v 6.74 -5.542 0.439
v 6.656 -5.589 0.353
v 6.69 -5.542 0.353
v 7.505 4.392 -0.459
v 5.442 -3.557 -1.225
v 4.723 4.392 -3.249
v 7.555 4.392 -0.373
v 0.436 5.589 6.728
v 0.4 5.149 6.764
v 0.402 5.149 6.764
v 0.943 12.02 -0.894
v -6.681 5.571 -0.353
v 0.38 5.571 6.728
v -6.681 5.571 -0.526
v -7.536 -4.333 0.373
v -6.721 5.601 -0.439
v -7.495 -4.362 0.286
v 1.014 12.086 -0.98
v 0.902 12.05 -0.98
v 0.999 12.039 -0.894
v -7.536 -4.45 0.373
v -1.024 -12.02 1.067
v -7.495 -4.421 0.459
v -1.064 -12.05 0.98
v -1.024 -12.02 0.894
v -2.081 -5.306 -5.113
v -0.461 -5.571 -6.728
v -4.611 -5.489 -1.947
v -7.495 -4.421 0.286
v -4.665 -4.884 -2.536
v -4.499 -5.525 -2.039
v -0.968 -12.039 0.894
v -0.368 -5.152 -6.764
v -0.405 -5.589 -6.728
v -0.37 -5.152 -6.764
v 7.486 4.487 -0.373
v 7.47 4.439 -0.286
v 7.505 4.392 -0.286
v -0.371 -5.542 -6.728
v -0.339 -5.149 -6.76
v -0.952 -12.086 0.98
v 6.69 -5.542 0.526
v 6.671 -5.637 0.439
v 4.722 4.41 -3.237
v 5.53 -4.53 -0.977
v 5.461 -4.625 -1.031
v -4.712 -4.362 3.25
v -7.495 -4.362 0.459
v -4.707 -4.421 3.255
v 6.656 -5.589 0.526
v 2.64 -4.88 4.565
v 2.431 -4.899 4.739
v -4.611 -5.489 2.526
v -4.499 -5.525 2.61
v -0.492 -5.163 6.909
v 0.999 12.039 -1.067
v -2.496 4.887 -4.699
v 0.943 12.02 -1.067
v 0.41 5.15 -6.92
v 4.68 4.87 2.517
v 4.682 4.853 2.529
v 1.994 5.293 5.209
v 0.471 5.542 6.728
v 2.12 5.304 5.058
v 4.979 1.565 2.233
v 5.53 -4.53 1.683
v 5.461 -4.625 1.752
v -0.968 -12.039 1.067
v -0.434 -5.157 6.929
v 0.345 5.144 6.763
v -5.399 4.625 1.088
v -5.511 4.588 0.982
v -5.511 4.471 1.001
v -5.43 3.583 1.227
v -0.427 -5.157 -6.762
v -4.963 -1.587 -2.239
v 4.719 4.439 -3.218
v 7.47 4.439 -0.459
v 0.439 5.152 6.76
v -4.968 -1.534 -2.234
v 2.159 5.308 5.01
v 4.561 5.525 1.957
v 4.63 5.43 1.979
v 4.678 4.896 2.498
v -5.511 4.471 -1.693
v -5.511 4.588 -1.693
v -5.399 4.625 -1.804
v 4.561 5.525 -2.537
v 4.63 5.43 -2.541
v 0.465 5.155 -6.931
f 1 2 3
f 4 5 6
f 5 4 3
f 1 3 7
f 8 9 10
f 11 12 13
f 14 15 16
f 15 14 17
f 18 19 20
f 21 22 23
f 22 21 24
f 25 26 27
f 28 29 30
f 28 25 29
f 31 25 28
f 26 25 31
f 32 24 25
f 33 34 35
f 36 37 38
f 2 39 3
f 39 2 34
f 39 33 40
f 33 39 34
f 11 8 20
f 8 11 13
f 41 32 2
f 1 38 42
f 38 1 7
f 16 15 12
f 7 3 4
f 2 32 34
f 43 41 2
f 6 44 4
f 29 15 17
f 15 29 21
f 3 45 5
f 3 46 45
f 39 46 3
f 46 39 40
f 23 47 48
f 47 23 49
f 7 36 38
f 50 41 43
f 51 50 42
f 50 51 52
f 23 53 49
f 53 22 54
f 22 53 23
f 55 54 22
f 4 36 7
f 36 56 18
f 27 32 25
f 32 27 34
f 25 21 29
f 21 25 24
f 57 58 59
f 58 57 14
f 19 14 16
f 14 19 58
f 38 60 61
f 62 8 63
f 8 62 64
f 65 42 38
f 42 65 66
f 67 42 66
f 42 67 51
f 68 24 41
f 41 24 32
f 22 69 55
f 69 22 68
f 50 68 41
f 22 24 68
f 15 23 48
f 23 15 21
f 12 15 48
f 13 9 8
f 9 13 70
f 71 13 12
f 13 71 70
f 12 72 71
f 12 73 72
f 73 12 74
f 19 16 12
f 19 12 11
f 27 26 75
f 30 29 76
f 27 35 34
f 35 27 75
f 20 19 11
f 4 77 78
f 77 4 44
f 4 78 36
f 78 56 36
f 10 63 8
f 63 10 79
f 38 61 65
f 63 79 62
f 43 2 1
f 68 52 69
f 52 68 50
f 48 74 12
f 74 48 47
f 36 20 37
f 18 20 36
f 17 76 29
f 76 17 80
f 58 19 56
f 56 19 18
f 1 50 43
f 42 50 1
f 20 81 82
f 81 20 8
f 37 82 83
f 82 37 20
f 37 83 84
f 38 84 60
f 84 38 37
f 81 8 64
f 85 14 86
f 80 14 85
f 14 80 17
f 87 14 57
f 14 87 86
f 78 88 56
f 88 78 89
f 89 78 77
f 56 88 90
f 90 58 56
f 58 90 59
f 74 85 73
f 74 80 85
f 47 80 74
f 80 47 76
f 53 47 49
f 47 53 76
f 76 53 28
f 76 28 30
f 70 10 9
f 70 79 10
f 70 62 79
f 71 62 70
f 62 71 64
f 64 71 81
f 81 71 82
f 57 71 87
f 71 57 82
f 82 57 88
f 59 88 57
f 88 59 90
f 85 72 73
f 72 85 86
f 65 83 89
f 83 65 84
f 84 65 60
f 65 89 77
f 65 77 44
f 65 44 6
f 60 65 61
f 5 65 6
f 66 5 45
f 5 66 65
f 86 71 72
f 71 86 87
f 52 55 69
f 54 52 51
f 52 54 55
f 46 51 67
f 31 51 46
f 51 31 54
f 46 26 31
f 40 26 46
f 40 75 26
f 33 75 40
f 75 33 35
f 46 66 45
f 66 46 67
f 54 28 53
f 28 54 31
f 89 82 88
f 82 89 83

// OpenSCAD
// Auto-generated OpenSCAD file

    inner_points = 10*[[0.5429769689115526, -0.4529635870924383, 0.49999999999997413], [0.5429769689115337, -0.4529635870924037, -0.500000000000026], [-0.4529635870924116, -0.5429769689115604, 0.49999999999998984], [-0.4529635870924304, -0.5429769689115258, -0.5000000000000102], [0.4529635870924304, 0.5429769689115258, 0.5000000000000102], [0.4529635870924116, 0.5429769689115604, -0.49999999999998984], [-0.5429769689115337, 0.4529635870924037, 0.500000000000026], [-0.5429769689115526, 0.4529635870924383, -0.49999999999997413], [2.2755059616728634e-14, -4.168991678798836e-14, 1.2071067811865475], [-2.2755059616728634e-14, 4.168991678798836e-14, -1.2071067811865475]];

    outer_points = 10*[[-0.039354312458118546, -0.43916949600833827, 0.7453733238228553], [0.04209249648260477, 0.5541932458770876, 0.6641521421813528], [0.6640328188038629, -0.5541932458770876, 0.04393474451517876], [0.7454796277445863, 0.43916949600833827, -0.03728643712632368], [-0.7454796277445863, -0.43916949600833827, 0.03728643712632368], [-0.6640328188038629, 0.5541932458770876, -0.04393474451517876], [-0.04209249648260477, -0.5541932458770876, -0.6641521421813528], [0.039354312458118546, 0.43916949600833827, -0.7453733238228553], [-0.09831499537835225, -1.1990949019079598, 0.09804263913544194], [0.09831499537835225, 1.1990949019079598, -0.09804263913544194]];

    // Convex hull for inner set (I)
    module inner_hull() {
        hull() {
            for (p = inner_points) {
                translate(p) sphere(r=0.1);
            }
        }
    }

    // Convex hull for outer set (O) minus inner hull (O \ I)
    module outer_minus_inner() {
        difference() {
            hull() {
                for (p = outer_points) {
                    translate(p) sphere(r=0.1);
                }
            }
            inner_hull(); // Subtract inner hull
        }
    }

    // Convex hull for outer set (O) minus all translated inner hulls
    module outer_minus_AllTranslationInner() {
        difference() {
            hull() {
                for (p = outer_points) {
                    translate(p) sphere(r=0.1);
                }
            }
            hull() {
                translate([0,0,50]) inner_hull();
                translate([0,0,-50]) inner_hull();
            }; // Subtract translated inner hulls
        }
    }

    // Difference between outer_minus_inner and outer_minus_AllTranslationInner
    module outer_minus_inner_diff() {
        difference() {
            // Outer minus inner
            difference() {
                hull() {
                    for (p = outer_points) {
                        translate(p) sphere(r=0.1);
                    }
                }
                inner_hull();
            }

            // Subtract Outer minus AllTranslationInner
            difference() {
                hull() {
                    for (p = outer_points) {
                        translate(p) sphere(r=0.1);
                    }
                }
                hull() {
                    translate([0,0,50]) inner_hull();
                    translate([0,0,-50]) inner_hull();
                };
            }
        }
    }

    // Rendering all with colors applied
    color([0, 1, 0, 1]) outer_minus_AllTranslationInner(); // Opaque green
    
